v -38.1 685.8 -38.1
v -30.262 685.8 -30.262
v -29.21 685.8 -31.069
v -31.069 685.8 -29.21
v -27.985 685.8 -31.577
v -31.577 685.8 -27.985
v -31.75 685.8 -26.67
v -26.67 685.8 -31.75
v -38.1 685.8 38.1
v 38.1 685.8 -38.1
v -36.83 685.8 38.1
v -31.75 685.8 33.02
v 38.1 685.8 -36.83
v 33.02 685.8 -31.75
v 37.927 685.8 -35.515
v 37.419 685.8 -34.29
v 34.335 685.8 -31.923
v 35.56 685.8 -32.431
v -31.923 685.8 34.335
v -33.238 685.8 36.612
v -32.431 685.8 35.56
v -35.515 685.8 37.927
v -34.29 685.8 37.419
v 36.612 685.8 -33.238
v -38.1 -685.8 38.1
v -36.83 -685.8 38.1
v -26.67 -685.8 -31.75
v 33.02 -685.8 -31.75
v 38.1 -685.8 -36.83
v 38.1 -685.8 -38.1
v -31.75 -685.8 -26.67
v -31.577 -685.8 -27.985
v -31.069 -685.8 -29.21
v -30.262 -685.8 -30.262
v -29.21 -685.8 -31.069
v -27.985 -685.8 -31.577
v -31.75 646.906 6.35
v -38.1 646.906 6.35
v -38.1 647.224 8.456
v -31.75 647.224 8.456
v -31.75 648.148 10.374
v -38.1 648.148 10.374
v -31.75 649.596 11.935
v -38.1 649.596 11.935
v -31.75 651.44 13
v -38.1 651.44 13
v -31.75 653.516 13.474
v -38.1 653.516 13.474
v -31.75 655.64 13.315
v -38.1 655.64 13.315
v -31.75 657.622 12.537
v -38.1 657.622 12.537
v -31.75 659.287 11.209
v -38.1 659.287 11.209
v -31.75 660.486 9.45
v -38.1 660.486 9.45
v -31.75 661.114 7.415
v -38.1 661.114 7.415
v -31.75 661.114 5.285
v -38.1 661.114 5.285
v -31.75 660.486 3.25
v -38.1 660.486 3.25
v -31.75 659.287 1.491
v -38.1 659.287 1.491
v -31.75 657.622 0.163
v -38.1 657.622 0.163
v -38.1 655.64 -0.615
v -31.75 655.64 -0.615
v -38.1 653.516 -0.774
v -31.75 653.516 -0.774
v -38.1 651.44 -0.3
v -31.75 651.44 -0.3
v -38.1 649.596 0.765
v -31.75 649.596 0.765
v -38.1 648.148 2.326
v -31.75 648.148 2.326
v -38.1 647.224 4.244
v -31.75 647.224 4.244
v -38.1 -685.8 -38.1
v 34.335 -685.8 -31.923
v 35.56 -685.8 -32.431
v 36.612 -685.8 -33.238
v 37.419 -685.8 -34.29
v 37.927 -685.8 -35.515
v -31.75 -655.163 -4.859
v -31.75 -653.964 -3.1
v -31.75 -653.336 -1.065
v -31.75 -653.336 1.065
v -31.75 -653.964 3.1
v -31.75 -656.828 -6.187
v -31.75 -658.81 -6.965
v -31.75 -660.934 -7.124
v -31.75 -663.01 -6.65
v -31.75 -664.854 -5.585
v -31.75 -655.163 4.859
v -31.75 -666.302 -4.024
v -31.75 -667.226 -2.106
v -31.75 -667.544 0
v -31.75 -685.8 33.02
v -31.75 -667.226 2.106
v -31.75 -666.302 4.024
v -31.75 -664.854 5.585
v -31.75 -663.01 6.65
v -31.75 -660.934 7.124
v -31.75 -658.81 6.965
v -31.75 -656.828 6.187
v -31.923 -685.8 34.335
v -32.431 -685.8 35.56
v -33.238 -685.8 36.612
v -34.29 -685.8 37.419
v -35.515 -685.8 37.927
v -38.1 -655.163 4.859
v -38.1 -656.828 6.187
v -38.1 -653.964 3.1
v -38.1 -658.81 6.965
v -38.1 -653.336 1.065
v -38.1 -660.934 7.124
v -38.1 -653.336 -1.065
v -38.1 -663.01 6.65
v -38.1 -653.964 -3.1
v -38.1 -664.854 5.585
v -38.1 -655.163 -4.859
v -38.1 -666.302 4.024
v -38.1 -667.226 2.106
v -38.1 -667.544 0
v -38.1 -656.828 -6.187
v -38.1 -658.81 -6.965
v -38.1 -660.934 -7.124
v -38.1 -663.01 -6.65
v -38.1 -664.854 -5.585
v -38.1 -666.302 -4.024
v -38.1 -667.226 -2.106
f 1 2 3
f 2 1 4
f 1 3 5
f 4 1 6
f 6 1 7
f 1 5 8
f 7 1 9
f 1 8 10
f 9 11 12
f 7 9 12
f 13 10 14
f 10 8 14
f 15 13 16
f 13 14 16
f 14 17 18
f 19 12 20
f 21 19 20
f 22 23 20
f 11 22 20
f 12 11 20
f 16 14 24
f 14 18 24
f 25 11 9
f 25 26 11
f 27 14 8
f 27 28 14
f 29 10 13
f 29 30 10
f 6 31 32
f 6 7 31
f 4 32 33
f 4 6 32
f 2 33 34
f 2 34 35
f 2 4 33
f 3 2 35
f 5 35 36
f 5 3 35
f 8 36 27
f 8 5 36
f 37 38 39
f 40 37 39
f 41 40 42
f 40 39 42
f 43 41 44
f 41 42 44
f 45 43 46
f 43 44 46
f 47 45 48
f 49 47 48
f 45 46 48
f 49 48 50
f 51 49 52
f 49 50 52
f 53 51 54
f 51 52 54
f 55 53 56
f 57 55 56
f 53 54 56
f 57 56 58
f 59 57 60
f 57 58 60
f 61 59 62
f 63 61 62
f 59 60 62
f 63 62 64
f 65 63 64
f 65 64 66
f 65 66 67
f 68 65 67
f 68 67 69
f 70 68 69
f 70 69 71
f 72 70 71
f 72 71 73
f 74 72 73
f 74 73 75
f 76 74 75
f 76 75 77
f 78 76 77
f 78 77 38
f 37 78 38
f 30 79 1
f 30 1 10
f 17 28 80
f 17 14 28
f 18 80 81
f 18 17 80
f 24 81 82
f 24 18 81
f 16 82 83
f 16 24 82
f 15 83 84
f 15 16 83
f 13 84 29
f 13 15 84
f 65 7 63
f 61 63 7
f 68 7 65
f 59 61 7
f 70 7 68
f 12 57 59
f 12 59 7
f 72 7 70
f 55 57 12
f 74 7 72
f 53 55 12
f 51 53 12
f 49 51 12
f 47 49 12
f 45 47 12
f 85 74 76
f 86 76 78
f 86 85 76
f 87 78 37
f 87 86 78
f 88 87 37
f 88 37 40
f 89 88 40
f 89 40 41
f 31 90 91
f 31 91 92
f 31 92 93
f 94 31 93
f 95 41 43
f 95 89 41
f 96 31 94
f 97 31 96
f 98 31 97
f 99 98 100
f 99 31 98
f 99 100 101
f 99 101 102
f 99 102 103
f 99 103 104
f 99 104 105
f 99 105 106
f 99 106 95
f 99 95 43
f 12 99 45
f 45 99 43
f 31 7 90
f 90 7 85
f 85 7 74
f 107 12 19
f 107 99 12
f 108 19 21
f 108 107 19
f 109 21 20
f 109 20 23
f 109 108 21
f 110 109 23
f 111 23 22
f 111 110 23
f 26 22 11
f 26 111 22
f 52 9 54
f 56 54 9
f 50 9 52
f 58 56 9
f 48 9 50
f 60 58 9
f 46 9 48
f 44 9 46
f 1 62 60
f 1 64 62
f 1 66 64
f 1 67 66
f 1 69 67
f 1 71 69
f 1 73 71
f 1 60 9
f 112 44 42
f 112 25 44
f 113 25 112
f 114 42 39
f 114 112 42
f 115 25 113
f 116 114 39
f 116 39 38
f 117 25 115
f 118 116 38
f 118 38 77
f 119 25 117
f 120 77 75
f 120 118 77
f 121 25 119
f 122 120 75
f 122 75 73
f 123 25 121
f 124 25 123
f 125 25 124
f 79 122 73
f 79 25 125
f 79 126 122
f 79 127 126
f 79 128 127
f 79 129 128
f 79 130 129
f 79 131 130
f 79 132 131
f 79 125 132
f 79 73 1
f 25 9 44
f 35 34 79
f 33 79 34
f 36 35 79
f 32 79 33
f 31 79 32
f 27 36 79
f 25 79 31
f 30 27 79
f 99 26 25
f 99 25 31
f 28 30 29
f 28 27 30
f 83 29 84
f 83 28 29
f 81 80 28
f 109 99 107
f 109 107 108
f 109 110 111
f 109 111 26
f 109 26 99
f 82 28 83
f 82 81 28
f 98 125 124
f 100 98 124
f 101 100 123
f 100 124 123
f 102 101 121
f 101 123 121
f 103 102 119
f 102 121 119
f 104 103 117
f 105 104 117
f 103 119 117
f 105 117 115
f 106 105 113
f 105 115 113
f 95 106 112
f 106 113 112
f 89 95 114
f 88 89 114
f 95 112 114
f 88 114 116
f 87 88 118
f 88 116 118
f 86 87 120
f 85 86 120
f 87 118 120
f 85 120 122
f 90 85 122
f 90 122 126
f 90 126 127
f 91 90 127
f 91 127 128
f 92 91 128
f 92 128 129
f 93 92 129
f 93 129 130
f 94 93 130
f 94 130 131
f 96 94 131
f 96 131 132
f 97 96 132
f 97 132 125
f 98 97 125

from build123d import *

# Parameters (mm, degrees)
F1_DEPTH = 685.8
F2_R     = 5.08
F3_R     = 7.14375
F4_DEPTH = 25.4


with BuildPart() as f1:
    # F0 (on Front) → F1 (new body, symmetric)
    with BuildSketch(Plane.XZ):
        Polygon((-31.75, -31.75), (-31.75, 38.1), (-38.1, 38.1), (-38.1, -38.1), (38.1, -38.1), (38.1, -31.75), align=None)
    extrude(amount=F1_DEPTH, both=True)

    # F2
    f2_edges = [f1.edges().sort_by_distance(p)[0] for p in [
        (-31.75, 0, -31.75),
        (-31.75, 0, 38.1),
        (38.1, 0, -31.75),
    ]]
    fillet(f2_edges, radius=F2_R)

    # F3 (on face) → F4 (cut)
    with BuildSketch(Plane(origin=(-38.1, 0, 0), x_dir=(0, -1, 0), z_dir=(-1, 0, 0))):
        with Locations((660.4, 0)):
            Circle(F3_R)
        with Locations((-654.05, 6.35)):
            Circle(F3_R)
    extrude(amount=-F4_DEPTH, mode=Mode.SUBTRACT)


solid = f1.part
